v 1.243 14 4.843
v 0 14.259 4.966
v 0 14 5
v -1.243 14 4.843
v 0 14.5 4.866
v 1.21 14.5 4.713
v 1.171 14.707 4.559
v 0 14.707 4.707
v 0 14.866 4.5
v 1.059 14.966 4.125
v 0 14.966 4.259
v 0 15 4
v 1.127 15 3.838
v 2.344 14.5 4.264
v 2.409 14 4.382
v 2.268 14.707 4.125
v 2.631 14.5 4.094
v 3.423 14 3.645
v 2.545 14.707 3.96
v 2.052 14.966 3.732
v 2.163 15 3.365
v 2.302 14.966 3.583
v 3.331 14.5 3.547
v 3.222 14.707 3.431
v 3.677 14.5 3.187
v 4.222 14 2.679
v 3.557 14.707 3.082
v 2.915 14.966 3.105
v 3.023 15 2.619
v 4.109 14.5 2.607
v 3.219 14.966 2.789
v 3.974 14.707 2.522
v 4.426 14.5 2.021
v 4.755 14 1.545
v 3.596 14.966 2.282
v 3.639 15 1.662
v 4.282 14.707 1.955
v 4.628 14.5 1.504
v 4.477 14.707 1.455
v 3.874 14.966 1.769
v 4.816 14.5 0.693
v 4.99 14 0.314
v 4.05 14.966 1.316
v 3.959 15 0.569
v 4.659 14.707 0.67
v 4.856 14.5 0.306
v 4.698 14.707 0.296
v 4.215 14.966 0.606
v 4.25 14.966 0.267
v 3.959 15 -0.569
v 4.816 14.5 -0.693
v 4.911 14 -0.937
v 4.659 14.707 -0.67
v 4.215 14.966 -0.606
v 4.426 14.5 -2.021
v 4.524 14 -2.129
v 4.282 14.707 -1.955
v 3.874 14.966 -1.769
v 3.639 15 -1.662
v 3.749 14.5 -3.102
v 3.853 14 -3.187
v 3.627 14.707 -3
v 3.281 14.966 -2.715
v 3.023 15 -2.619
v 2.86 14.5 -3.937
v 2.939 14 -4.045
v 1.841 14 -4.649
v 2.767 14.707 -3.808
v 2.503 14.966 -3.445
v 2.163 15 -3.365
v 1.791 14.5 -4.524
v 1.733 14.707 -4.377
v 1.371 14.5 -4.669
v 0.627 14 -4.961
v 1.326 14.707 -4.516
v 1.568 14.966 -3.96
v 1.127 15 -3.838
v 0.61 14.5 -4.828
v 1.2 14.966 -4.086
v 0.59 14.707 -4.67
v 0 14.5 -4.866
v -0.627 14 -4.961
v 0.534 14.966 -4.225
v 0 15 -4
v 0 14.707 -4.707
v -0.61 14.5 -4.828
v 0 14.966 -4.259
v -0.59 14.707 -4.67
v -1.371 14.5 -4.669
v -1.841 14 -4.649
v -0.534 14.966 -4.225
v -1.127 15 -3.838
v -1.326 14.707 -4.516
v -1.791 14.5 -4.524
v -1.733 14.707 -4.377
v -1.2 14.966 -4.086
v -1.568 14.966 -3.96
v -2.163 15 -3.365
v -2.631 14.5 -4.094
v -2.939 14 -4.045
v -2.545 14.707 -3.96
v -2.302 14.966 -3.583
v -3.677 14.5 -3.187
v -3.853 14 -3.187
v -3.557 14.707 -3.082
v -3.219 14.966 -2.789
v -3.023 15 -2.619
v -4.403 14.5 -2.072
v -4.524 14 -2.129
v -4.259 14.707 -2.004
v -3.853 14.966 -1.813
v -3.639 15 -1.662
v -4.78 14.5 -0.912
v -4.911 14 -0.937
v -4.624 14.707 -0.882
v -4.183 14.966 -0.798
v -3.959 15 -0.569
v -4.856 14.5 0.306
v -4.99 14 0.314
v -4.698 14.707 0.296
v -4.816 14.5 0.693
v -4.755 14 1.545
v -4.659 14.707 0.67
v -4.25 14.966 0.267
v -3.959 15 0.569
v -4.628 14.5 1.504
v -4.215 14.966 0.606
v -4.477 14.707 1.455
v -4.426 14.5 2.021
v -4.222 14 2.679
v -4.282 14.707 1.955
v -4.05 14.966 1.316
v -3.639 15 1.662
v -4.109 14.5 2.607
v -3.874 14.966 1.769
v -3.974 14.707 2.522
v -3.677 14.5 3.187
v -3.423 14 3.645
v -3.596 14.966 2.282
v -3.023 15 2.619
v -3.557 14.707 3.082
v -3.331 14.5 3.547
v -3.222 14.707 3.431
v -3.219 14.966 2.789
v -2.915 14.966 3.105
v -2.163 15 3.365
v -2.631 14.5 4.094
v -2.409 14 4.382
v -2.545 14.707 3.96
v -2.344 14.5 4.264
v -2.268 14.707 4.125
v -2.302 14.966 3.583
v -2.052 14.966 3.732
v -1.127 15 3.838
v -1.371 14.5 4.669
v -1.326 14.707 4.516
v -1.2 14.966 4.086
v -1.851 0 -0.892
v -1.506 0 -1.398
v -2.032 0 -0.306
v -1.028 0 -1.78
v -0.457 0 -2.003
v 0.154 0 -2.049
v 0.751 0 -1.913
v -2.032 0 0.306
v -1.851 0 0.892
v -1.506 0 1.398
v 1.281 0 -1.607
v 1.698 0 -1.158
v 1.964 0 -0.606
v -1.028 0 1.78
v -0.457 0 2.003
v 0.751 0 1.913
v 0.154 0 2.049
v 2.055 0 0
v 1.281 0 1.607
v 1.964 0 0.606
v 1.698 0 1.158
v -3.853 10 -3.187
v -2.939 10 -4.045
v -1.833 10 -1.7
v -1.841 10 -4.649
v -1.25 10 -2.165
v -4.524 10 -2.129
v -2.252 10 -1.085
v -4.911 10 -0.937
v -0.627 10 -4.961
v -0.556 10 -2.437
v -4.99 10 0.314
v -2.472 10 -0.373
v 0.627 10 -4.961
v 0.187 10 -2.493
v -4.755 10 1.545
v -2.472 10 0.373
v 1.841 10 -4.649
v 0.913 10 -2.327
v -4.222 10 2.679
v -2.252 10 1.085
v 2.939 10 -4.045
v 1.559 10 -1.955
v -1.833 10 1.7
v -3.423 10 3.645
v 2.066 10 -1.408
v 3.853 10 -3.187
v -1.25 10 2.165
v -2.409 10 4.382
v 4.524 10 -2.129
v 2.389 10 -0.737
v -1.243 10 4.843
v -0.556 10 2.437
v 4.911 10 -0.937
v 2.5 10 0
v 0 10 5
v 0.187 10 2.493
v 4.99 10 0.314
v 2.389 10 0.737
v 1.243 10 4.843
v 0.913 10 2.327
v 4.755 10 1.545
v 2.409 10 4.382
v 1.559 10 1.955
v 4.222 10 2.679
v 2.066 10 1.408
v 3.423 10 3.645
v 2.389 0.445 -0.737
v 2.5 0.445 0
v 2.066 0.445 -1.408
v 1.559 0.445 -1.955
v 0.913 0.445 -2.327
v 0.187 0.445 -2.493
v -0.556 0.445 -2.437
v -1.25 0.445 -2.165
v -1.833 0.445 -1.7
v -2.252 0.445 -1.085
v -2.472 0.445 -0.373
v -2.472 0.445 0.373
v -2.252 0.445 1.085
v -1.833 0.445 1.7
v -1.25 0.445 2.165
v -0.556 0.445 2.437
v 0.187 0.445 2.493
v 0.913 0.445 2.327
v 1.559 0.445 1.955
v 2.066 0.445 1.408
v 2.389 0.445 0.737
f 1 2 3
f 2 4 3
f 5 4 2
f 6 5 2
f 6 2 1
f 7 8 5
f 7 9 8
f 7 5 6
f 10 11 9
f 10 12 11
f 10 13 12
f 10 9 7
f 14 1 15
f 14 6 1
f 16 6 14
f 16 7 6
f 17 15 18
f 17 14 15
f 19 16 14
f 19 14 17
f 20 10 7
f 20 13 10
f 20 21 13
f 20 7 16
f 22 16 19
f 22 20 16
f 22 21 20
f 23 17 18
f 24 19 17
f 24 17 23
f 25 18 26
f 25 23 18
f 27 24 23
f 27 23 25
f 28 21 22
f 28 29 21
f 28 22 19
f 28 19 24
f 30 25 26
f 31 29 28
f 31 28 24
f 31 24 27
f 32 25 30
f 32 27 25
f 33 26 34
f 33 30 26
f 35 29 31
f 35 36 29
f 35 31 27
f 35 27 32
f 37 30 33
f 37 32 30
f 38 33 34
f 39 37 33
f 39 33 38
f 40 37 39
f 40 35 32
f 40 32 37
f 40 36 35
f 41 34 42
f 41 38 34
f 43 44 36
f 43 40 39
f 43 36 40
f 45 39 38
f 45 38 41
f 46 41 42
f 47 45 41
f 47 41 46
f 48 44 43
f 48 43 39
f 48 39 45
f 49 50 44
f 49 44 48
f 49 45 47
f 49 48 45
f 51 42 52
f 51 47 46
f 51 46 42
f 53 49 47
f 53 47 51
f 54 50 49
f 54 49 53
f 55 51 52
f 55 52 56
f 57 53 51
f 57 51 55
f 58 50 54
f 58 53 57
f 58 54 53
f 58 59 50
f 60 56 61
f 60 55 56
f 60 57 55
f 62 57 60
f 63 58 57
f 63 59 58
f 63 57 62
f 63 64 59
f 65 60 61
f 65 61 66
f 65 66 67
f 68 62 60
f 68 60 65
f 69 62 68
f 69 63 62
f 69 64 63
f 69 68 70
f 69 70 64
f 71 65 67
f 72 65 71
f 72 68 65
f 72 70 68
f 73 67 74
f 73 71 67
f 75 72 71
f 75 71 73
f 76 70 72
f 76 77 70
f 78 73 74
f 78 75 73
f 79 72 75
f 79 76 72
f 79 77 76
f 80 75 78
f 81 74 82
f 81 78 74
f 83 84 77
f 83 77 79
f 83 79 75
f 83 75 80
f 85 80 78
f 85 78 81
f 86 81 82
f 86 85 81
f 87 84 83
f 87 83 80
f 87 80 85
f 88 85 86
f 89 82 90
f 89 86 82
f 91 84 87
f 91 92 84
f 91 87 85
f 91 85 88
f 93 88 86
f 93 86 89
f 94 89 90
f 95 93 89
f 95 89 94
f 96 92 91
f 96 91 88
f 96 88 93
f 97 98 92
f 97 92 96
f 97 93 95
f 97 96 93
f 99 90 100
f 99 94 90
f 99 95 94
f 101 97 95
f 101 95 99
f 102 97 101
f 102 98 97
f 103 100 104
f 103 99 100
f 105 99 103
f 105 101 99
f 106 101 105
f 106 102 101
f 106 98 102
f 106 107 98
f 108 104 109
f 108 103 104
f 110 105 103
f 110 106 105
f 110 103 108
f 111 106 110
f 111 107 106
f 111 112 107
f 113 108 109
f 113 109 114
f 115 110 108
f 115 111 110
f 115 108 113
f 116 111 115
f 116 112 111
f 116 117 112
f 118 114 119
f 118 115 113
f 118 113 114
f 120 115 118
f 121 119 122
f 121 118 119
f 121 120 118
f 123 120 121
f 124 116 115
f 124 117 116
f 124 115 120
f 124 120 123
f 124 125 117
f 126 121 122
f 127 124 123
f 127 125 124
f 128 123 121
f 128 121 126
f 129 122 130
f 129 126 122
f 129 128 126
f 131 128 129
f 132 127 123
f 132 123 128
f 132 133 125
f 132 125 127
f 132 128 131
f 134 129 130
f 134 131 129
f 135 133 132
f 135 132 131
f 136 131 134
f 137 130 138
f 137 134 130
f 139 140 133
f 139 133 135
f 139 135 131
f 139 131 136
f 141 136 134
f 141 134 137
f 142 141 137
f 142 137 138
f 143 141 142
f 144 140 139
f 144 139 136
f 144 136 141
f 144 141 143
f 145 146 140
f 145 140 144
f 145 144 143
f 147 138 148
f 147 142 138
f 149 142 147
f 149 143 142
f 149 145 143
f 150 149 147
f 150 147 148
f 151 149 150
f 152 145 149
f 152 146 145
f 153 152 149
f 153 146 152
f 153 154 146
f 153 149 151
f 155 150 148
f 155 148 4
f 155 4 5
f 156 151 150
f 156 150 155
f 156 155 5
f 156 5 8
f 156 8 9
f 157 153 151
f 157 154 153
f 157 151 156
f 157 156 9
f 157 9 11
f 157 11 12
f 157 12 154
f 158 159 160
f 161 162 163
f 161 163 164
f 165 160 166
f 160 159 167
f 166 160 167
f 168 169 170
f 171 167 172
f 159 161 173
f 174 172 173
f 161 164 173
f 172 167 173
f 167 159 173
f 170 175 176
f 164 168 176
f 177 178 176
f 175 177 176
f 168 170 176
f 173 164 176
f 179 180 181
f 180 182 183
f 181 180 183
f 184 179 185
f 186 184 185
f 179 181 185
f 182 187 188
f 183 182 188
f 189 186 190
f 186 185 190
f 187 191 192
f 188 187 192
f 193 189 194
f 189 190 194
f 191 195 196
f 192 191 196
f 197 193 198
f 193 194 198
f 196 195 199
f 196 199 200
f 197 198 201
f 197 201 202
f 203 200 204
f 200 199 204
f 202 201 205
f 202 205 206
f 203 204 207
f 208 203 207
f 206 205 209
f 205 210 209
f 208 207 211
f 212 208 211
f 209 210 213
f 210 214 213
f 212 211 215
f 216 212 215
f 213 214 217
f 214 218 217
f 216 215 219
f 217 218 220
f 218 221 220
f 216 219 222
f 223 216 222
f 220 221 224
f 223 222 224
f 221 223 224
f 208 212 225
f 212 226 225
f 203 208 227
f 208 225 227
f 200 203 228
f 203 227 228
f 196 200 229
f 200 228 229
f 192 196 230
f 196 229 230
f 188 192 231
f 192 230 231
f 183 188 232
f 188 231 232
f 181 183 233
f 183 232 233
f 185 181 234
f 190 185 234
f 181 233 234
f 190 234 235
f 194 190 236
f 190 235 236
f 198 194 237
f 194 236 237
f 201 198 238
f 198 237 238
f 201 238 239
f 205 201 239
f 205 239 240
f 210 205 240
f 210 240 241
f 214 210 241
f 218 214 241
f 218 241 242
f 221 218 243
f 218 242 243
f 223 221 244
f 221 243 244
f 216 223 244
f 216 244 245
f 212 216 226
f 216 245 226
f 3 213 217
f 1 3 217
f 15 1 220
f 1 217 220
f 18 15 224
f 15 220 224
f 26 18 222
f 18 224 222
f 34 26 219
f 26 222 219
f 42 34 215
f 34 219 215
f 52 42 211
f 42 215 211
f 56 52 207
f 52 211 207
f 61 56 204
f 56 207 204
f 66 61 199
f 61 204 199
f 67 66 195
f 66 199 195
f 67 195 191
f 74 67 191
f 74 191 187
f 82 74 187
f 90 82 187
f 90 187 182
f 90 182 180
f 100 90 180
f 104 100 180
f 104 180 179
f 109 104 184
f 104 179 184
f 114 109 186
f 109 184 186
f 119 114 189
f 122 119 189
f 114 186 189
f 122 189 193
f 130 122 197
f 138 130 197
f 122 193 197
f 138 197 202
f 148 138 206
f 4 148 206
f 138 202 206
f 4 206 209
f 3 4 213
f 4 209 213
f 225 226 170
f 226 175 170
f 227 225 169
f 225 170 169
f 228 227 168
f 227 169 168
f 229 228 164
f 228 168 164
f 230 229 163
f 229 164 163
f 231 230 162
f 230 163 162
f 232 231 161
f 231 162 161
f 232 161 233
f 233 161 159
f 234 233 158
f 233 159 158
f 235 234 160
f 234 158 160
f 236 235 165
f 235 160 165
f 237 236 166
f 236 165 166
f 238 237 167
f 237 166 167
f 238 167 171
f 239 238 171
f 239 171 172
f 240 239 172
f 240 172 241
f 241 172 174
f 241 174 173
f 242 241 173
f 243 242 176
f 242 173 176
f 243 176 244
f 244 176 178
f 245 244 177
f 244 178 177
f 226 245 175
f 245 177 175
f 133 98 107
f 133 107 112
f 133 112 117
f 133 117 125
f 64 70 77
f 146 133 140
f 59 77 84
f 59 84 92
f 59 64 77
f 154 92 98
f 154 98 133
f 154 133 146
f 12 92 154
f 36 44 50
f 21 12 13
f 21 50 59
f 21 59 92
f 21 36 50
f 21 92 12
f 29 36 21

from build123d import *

# Parameters (mm, degrees)
SKETCH1_R           = 3
BOSS_EXTRUDE1_DEPTH = 10
SKETCH2_R           = 5
BOSS_EXTRUDE2_DEPTH = 5
FILLET1_R           = 1


# Read off the part's stored shape, not the designer's step: M5 Machine Threads Stud1
with BuildPart() as part:
    # Sketch1 → Boss-Extrude1 (new body)
    with BuildSketch(Plane(origin=(0, 0, 0), x_dir=(1, 0, 0), z_dir=(0, 1, 0))):
        with Locations(Location((0, 0, 0), (0, 0, 270))):
            Circle(SKETCH1_R)
    extrude(amount=BOSS_EXTRUDE1_DEPTH)

    # Sketch2 → Boss-Extrude2 (add)
    with BuildSketch(Plane(origin=(0, 10, 0), x_dir=(1, 0, 0), z_dir=(0, 1, 0))):
        with Locations(Location((0, 0, 0), (0, 0, 270))):
            Circle(SKETCH2_R)
    extrude(amount=BOSS_EXTRUDE2_DEPTH)

    # Fillet1
    fillet1_edges = [part.edges().sort_by_distance(p)[0] for p in [
        (0, 15, -5),
    ]]
    fillet(fillet1_edges, radius=FILLET1_R)

    # M5 Machine Threads Stud1 outline → M5 Machine Threads Stud1 (revolve, cut)
    with BuildSketch(Plane.XY):
        Polygon((3, 10), (2.5, 10), (2.5, 0.445), (2.055, 0), (3, 0), align=None)
    revolve(axis=Axis((0, 0, 0), (0, 1, 0)), mode=Mode.SUBTRACT)


solid = part.part
